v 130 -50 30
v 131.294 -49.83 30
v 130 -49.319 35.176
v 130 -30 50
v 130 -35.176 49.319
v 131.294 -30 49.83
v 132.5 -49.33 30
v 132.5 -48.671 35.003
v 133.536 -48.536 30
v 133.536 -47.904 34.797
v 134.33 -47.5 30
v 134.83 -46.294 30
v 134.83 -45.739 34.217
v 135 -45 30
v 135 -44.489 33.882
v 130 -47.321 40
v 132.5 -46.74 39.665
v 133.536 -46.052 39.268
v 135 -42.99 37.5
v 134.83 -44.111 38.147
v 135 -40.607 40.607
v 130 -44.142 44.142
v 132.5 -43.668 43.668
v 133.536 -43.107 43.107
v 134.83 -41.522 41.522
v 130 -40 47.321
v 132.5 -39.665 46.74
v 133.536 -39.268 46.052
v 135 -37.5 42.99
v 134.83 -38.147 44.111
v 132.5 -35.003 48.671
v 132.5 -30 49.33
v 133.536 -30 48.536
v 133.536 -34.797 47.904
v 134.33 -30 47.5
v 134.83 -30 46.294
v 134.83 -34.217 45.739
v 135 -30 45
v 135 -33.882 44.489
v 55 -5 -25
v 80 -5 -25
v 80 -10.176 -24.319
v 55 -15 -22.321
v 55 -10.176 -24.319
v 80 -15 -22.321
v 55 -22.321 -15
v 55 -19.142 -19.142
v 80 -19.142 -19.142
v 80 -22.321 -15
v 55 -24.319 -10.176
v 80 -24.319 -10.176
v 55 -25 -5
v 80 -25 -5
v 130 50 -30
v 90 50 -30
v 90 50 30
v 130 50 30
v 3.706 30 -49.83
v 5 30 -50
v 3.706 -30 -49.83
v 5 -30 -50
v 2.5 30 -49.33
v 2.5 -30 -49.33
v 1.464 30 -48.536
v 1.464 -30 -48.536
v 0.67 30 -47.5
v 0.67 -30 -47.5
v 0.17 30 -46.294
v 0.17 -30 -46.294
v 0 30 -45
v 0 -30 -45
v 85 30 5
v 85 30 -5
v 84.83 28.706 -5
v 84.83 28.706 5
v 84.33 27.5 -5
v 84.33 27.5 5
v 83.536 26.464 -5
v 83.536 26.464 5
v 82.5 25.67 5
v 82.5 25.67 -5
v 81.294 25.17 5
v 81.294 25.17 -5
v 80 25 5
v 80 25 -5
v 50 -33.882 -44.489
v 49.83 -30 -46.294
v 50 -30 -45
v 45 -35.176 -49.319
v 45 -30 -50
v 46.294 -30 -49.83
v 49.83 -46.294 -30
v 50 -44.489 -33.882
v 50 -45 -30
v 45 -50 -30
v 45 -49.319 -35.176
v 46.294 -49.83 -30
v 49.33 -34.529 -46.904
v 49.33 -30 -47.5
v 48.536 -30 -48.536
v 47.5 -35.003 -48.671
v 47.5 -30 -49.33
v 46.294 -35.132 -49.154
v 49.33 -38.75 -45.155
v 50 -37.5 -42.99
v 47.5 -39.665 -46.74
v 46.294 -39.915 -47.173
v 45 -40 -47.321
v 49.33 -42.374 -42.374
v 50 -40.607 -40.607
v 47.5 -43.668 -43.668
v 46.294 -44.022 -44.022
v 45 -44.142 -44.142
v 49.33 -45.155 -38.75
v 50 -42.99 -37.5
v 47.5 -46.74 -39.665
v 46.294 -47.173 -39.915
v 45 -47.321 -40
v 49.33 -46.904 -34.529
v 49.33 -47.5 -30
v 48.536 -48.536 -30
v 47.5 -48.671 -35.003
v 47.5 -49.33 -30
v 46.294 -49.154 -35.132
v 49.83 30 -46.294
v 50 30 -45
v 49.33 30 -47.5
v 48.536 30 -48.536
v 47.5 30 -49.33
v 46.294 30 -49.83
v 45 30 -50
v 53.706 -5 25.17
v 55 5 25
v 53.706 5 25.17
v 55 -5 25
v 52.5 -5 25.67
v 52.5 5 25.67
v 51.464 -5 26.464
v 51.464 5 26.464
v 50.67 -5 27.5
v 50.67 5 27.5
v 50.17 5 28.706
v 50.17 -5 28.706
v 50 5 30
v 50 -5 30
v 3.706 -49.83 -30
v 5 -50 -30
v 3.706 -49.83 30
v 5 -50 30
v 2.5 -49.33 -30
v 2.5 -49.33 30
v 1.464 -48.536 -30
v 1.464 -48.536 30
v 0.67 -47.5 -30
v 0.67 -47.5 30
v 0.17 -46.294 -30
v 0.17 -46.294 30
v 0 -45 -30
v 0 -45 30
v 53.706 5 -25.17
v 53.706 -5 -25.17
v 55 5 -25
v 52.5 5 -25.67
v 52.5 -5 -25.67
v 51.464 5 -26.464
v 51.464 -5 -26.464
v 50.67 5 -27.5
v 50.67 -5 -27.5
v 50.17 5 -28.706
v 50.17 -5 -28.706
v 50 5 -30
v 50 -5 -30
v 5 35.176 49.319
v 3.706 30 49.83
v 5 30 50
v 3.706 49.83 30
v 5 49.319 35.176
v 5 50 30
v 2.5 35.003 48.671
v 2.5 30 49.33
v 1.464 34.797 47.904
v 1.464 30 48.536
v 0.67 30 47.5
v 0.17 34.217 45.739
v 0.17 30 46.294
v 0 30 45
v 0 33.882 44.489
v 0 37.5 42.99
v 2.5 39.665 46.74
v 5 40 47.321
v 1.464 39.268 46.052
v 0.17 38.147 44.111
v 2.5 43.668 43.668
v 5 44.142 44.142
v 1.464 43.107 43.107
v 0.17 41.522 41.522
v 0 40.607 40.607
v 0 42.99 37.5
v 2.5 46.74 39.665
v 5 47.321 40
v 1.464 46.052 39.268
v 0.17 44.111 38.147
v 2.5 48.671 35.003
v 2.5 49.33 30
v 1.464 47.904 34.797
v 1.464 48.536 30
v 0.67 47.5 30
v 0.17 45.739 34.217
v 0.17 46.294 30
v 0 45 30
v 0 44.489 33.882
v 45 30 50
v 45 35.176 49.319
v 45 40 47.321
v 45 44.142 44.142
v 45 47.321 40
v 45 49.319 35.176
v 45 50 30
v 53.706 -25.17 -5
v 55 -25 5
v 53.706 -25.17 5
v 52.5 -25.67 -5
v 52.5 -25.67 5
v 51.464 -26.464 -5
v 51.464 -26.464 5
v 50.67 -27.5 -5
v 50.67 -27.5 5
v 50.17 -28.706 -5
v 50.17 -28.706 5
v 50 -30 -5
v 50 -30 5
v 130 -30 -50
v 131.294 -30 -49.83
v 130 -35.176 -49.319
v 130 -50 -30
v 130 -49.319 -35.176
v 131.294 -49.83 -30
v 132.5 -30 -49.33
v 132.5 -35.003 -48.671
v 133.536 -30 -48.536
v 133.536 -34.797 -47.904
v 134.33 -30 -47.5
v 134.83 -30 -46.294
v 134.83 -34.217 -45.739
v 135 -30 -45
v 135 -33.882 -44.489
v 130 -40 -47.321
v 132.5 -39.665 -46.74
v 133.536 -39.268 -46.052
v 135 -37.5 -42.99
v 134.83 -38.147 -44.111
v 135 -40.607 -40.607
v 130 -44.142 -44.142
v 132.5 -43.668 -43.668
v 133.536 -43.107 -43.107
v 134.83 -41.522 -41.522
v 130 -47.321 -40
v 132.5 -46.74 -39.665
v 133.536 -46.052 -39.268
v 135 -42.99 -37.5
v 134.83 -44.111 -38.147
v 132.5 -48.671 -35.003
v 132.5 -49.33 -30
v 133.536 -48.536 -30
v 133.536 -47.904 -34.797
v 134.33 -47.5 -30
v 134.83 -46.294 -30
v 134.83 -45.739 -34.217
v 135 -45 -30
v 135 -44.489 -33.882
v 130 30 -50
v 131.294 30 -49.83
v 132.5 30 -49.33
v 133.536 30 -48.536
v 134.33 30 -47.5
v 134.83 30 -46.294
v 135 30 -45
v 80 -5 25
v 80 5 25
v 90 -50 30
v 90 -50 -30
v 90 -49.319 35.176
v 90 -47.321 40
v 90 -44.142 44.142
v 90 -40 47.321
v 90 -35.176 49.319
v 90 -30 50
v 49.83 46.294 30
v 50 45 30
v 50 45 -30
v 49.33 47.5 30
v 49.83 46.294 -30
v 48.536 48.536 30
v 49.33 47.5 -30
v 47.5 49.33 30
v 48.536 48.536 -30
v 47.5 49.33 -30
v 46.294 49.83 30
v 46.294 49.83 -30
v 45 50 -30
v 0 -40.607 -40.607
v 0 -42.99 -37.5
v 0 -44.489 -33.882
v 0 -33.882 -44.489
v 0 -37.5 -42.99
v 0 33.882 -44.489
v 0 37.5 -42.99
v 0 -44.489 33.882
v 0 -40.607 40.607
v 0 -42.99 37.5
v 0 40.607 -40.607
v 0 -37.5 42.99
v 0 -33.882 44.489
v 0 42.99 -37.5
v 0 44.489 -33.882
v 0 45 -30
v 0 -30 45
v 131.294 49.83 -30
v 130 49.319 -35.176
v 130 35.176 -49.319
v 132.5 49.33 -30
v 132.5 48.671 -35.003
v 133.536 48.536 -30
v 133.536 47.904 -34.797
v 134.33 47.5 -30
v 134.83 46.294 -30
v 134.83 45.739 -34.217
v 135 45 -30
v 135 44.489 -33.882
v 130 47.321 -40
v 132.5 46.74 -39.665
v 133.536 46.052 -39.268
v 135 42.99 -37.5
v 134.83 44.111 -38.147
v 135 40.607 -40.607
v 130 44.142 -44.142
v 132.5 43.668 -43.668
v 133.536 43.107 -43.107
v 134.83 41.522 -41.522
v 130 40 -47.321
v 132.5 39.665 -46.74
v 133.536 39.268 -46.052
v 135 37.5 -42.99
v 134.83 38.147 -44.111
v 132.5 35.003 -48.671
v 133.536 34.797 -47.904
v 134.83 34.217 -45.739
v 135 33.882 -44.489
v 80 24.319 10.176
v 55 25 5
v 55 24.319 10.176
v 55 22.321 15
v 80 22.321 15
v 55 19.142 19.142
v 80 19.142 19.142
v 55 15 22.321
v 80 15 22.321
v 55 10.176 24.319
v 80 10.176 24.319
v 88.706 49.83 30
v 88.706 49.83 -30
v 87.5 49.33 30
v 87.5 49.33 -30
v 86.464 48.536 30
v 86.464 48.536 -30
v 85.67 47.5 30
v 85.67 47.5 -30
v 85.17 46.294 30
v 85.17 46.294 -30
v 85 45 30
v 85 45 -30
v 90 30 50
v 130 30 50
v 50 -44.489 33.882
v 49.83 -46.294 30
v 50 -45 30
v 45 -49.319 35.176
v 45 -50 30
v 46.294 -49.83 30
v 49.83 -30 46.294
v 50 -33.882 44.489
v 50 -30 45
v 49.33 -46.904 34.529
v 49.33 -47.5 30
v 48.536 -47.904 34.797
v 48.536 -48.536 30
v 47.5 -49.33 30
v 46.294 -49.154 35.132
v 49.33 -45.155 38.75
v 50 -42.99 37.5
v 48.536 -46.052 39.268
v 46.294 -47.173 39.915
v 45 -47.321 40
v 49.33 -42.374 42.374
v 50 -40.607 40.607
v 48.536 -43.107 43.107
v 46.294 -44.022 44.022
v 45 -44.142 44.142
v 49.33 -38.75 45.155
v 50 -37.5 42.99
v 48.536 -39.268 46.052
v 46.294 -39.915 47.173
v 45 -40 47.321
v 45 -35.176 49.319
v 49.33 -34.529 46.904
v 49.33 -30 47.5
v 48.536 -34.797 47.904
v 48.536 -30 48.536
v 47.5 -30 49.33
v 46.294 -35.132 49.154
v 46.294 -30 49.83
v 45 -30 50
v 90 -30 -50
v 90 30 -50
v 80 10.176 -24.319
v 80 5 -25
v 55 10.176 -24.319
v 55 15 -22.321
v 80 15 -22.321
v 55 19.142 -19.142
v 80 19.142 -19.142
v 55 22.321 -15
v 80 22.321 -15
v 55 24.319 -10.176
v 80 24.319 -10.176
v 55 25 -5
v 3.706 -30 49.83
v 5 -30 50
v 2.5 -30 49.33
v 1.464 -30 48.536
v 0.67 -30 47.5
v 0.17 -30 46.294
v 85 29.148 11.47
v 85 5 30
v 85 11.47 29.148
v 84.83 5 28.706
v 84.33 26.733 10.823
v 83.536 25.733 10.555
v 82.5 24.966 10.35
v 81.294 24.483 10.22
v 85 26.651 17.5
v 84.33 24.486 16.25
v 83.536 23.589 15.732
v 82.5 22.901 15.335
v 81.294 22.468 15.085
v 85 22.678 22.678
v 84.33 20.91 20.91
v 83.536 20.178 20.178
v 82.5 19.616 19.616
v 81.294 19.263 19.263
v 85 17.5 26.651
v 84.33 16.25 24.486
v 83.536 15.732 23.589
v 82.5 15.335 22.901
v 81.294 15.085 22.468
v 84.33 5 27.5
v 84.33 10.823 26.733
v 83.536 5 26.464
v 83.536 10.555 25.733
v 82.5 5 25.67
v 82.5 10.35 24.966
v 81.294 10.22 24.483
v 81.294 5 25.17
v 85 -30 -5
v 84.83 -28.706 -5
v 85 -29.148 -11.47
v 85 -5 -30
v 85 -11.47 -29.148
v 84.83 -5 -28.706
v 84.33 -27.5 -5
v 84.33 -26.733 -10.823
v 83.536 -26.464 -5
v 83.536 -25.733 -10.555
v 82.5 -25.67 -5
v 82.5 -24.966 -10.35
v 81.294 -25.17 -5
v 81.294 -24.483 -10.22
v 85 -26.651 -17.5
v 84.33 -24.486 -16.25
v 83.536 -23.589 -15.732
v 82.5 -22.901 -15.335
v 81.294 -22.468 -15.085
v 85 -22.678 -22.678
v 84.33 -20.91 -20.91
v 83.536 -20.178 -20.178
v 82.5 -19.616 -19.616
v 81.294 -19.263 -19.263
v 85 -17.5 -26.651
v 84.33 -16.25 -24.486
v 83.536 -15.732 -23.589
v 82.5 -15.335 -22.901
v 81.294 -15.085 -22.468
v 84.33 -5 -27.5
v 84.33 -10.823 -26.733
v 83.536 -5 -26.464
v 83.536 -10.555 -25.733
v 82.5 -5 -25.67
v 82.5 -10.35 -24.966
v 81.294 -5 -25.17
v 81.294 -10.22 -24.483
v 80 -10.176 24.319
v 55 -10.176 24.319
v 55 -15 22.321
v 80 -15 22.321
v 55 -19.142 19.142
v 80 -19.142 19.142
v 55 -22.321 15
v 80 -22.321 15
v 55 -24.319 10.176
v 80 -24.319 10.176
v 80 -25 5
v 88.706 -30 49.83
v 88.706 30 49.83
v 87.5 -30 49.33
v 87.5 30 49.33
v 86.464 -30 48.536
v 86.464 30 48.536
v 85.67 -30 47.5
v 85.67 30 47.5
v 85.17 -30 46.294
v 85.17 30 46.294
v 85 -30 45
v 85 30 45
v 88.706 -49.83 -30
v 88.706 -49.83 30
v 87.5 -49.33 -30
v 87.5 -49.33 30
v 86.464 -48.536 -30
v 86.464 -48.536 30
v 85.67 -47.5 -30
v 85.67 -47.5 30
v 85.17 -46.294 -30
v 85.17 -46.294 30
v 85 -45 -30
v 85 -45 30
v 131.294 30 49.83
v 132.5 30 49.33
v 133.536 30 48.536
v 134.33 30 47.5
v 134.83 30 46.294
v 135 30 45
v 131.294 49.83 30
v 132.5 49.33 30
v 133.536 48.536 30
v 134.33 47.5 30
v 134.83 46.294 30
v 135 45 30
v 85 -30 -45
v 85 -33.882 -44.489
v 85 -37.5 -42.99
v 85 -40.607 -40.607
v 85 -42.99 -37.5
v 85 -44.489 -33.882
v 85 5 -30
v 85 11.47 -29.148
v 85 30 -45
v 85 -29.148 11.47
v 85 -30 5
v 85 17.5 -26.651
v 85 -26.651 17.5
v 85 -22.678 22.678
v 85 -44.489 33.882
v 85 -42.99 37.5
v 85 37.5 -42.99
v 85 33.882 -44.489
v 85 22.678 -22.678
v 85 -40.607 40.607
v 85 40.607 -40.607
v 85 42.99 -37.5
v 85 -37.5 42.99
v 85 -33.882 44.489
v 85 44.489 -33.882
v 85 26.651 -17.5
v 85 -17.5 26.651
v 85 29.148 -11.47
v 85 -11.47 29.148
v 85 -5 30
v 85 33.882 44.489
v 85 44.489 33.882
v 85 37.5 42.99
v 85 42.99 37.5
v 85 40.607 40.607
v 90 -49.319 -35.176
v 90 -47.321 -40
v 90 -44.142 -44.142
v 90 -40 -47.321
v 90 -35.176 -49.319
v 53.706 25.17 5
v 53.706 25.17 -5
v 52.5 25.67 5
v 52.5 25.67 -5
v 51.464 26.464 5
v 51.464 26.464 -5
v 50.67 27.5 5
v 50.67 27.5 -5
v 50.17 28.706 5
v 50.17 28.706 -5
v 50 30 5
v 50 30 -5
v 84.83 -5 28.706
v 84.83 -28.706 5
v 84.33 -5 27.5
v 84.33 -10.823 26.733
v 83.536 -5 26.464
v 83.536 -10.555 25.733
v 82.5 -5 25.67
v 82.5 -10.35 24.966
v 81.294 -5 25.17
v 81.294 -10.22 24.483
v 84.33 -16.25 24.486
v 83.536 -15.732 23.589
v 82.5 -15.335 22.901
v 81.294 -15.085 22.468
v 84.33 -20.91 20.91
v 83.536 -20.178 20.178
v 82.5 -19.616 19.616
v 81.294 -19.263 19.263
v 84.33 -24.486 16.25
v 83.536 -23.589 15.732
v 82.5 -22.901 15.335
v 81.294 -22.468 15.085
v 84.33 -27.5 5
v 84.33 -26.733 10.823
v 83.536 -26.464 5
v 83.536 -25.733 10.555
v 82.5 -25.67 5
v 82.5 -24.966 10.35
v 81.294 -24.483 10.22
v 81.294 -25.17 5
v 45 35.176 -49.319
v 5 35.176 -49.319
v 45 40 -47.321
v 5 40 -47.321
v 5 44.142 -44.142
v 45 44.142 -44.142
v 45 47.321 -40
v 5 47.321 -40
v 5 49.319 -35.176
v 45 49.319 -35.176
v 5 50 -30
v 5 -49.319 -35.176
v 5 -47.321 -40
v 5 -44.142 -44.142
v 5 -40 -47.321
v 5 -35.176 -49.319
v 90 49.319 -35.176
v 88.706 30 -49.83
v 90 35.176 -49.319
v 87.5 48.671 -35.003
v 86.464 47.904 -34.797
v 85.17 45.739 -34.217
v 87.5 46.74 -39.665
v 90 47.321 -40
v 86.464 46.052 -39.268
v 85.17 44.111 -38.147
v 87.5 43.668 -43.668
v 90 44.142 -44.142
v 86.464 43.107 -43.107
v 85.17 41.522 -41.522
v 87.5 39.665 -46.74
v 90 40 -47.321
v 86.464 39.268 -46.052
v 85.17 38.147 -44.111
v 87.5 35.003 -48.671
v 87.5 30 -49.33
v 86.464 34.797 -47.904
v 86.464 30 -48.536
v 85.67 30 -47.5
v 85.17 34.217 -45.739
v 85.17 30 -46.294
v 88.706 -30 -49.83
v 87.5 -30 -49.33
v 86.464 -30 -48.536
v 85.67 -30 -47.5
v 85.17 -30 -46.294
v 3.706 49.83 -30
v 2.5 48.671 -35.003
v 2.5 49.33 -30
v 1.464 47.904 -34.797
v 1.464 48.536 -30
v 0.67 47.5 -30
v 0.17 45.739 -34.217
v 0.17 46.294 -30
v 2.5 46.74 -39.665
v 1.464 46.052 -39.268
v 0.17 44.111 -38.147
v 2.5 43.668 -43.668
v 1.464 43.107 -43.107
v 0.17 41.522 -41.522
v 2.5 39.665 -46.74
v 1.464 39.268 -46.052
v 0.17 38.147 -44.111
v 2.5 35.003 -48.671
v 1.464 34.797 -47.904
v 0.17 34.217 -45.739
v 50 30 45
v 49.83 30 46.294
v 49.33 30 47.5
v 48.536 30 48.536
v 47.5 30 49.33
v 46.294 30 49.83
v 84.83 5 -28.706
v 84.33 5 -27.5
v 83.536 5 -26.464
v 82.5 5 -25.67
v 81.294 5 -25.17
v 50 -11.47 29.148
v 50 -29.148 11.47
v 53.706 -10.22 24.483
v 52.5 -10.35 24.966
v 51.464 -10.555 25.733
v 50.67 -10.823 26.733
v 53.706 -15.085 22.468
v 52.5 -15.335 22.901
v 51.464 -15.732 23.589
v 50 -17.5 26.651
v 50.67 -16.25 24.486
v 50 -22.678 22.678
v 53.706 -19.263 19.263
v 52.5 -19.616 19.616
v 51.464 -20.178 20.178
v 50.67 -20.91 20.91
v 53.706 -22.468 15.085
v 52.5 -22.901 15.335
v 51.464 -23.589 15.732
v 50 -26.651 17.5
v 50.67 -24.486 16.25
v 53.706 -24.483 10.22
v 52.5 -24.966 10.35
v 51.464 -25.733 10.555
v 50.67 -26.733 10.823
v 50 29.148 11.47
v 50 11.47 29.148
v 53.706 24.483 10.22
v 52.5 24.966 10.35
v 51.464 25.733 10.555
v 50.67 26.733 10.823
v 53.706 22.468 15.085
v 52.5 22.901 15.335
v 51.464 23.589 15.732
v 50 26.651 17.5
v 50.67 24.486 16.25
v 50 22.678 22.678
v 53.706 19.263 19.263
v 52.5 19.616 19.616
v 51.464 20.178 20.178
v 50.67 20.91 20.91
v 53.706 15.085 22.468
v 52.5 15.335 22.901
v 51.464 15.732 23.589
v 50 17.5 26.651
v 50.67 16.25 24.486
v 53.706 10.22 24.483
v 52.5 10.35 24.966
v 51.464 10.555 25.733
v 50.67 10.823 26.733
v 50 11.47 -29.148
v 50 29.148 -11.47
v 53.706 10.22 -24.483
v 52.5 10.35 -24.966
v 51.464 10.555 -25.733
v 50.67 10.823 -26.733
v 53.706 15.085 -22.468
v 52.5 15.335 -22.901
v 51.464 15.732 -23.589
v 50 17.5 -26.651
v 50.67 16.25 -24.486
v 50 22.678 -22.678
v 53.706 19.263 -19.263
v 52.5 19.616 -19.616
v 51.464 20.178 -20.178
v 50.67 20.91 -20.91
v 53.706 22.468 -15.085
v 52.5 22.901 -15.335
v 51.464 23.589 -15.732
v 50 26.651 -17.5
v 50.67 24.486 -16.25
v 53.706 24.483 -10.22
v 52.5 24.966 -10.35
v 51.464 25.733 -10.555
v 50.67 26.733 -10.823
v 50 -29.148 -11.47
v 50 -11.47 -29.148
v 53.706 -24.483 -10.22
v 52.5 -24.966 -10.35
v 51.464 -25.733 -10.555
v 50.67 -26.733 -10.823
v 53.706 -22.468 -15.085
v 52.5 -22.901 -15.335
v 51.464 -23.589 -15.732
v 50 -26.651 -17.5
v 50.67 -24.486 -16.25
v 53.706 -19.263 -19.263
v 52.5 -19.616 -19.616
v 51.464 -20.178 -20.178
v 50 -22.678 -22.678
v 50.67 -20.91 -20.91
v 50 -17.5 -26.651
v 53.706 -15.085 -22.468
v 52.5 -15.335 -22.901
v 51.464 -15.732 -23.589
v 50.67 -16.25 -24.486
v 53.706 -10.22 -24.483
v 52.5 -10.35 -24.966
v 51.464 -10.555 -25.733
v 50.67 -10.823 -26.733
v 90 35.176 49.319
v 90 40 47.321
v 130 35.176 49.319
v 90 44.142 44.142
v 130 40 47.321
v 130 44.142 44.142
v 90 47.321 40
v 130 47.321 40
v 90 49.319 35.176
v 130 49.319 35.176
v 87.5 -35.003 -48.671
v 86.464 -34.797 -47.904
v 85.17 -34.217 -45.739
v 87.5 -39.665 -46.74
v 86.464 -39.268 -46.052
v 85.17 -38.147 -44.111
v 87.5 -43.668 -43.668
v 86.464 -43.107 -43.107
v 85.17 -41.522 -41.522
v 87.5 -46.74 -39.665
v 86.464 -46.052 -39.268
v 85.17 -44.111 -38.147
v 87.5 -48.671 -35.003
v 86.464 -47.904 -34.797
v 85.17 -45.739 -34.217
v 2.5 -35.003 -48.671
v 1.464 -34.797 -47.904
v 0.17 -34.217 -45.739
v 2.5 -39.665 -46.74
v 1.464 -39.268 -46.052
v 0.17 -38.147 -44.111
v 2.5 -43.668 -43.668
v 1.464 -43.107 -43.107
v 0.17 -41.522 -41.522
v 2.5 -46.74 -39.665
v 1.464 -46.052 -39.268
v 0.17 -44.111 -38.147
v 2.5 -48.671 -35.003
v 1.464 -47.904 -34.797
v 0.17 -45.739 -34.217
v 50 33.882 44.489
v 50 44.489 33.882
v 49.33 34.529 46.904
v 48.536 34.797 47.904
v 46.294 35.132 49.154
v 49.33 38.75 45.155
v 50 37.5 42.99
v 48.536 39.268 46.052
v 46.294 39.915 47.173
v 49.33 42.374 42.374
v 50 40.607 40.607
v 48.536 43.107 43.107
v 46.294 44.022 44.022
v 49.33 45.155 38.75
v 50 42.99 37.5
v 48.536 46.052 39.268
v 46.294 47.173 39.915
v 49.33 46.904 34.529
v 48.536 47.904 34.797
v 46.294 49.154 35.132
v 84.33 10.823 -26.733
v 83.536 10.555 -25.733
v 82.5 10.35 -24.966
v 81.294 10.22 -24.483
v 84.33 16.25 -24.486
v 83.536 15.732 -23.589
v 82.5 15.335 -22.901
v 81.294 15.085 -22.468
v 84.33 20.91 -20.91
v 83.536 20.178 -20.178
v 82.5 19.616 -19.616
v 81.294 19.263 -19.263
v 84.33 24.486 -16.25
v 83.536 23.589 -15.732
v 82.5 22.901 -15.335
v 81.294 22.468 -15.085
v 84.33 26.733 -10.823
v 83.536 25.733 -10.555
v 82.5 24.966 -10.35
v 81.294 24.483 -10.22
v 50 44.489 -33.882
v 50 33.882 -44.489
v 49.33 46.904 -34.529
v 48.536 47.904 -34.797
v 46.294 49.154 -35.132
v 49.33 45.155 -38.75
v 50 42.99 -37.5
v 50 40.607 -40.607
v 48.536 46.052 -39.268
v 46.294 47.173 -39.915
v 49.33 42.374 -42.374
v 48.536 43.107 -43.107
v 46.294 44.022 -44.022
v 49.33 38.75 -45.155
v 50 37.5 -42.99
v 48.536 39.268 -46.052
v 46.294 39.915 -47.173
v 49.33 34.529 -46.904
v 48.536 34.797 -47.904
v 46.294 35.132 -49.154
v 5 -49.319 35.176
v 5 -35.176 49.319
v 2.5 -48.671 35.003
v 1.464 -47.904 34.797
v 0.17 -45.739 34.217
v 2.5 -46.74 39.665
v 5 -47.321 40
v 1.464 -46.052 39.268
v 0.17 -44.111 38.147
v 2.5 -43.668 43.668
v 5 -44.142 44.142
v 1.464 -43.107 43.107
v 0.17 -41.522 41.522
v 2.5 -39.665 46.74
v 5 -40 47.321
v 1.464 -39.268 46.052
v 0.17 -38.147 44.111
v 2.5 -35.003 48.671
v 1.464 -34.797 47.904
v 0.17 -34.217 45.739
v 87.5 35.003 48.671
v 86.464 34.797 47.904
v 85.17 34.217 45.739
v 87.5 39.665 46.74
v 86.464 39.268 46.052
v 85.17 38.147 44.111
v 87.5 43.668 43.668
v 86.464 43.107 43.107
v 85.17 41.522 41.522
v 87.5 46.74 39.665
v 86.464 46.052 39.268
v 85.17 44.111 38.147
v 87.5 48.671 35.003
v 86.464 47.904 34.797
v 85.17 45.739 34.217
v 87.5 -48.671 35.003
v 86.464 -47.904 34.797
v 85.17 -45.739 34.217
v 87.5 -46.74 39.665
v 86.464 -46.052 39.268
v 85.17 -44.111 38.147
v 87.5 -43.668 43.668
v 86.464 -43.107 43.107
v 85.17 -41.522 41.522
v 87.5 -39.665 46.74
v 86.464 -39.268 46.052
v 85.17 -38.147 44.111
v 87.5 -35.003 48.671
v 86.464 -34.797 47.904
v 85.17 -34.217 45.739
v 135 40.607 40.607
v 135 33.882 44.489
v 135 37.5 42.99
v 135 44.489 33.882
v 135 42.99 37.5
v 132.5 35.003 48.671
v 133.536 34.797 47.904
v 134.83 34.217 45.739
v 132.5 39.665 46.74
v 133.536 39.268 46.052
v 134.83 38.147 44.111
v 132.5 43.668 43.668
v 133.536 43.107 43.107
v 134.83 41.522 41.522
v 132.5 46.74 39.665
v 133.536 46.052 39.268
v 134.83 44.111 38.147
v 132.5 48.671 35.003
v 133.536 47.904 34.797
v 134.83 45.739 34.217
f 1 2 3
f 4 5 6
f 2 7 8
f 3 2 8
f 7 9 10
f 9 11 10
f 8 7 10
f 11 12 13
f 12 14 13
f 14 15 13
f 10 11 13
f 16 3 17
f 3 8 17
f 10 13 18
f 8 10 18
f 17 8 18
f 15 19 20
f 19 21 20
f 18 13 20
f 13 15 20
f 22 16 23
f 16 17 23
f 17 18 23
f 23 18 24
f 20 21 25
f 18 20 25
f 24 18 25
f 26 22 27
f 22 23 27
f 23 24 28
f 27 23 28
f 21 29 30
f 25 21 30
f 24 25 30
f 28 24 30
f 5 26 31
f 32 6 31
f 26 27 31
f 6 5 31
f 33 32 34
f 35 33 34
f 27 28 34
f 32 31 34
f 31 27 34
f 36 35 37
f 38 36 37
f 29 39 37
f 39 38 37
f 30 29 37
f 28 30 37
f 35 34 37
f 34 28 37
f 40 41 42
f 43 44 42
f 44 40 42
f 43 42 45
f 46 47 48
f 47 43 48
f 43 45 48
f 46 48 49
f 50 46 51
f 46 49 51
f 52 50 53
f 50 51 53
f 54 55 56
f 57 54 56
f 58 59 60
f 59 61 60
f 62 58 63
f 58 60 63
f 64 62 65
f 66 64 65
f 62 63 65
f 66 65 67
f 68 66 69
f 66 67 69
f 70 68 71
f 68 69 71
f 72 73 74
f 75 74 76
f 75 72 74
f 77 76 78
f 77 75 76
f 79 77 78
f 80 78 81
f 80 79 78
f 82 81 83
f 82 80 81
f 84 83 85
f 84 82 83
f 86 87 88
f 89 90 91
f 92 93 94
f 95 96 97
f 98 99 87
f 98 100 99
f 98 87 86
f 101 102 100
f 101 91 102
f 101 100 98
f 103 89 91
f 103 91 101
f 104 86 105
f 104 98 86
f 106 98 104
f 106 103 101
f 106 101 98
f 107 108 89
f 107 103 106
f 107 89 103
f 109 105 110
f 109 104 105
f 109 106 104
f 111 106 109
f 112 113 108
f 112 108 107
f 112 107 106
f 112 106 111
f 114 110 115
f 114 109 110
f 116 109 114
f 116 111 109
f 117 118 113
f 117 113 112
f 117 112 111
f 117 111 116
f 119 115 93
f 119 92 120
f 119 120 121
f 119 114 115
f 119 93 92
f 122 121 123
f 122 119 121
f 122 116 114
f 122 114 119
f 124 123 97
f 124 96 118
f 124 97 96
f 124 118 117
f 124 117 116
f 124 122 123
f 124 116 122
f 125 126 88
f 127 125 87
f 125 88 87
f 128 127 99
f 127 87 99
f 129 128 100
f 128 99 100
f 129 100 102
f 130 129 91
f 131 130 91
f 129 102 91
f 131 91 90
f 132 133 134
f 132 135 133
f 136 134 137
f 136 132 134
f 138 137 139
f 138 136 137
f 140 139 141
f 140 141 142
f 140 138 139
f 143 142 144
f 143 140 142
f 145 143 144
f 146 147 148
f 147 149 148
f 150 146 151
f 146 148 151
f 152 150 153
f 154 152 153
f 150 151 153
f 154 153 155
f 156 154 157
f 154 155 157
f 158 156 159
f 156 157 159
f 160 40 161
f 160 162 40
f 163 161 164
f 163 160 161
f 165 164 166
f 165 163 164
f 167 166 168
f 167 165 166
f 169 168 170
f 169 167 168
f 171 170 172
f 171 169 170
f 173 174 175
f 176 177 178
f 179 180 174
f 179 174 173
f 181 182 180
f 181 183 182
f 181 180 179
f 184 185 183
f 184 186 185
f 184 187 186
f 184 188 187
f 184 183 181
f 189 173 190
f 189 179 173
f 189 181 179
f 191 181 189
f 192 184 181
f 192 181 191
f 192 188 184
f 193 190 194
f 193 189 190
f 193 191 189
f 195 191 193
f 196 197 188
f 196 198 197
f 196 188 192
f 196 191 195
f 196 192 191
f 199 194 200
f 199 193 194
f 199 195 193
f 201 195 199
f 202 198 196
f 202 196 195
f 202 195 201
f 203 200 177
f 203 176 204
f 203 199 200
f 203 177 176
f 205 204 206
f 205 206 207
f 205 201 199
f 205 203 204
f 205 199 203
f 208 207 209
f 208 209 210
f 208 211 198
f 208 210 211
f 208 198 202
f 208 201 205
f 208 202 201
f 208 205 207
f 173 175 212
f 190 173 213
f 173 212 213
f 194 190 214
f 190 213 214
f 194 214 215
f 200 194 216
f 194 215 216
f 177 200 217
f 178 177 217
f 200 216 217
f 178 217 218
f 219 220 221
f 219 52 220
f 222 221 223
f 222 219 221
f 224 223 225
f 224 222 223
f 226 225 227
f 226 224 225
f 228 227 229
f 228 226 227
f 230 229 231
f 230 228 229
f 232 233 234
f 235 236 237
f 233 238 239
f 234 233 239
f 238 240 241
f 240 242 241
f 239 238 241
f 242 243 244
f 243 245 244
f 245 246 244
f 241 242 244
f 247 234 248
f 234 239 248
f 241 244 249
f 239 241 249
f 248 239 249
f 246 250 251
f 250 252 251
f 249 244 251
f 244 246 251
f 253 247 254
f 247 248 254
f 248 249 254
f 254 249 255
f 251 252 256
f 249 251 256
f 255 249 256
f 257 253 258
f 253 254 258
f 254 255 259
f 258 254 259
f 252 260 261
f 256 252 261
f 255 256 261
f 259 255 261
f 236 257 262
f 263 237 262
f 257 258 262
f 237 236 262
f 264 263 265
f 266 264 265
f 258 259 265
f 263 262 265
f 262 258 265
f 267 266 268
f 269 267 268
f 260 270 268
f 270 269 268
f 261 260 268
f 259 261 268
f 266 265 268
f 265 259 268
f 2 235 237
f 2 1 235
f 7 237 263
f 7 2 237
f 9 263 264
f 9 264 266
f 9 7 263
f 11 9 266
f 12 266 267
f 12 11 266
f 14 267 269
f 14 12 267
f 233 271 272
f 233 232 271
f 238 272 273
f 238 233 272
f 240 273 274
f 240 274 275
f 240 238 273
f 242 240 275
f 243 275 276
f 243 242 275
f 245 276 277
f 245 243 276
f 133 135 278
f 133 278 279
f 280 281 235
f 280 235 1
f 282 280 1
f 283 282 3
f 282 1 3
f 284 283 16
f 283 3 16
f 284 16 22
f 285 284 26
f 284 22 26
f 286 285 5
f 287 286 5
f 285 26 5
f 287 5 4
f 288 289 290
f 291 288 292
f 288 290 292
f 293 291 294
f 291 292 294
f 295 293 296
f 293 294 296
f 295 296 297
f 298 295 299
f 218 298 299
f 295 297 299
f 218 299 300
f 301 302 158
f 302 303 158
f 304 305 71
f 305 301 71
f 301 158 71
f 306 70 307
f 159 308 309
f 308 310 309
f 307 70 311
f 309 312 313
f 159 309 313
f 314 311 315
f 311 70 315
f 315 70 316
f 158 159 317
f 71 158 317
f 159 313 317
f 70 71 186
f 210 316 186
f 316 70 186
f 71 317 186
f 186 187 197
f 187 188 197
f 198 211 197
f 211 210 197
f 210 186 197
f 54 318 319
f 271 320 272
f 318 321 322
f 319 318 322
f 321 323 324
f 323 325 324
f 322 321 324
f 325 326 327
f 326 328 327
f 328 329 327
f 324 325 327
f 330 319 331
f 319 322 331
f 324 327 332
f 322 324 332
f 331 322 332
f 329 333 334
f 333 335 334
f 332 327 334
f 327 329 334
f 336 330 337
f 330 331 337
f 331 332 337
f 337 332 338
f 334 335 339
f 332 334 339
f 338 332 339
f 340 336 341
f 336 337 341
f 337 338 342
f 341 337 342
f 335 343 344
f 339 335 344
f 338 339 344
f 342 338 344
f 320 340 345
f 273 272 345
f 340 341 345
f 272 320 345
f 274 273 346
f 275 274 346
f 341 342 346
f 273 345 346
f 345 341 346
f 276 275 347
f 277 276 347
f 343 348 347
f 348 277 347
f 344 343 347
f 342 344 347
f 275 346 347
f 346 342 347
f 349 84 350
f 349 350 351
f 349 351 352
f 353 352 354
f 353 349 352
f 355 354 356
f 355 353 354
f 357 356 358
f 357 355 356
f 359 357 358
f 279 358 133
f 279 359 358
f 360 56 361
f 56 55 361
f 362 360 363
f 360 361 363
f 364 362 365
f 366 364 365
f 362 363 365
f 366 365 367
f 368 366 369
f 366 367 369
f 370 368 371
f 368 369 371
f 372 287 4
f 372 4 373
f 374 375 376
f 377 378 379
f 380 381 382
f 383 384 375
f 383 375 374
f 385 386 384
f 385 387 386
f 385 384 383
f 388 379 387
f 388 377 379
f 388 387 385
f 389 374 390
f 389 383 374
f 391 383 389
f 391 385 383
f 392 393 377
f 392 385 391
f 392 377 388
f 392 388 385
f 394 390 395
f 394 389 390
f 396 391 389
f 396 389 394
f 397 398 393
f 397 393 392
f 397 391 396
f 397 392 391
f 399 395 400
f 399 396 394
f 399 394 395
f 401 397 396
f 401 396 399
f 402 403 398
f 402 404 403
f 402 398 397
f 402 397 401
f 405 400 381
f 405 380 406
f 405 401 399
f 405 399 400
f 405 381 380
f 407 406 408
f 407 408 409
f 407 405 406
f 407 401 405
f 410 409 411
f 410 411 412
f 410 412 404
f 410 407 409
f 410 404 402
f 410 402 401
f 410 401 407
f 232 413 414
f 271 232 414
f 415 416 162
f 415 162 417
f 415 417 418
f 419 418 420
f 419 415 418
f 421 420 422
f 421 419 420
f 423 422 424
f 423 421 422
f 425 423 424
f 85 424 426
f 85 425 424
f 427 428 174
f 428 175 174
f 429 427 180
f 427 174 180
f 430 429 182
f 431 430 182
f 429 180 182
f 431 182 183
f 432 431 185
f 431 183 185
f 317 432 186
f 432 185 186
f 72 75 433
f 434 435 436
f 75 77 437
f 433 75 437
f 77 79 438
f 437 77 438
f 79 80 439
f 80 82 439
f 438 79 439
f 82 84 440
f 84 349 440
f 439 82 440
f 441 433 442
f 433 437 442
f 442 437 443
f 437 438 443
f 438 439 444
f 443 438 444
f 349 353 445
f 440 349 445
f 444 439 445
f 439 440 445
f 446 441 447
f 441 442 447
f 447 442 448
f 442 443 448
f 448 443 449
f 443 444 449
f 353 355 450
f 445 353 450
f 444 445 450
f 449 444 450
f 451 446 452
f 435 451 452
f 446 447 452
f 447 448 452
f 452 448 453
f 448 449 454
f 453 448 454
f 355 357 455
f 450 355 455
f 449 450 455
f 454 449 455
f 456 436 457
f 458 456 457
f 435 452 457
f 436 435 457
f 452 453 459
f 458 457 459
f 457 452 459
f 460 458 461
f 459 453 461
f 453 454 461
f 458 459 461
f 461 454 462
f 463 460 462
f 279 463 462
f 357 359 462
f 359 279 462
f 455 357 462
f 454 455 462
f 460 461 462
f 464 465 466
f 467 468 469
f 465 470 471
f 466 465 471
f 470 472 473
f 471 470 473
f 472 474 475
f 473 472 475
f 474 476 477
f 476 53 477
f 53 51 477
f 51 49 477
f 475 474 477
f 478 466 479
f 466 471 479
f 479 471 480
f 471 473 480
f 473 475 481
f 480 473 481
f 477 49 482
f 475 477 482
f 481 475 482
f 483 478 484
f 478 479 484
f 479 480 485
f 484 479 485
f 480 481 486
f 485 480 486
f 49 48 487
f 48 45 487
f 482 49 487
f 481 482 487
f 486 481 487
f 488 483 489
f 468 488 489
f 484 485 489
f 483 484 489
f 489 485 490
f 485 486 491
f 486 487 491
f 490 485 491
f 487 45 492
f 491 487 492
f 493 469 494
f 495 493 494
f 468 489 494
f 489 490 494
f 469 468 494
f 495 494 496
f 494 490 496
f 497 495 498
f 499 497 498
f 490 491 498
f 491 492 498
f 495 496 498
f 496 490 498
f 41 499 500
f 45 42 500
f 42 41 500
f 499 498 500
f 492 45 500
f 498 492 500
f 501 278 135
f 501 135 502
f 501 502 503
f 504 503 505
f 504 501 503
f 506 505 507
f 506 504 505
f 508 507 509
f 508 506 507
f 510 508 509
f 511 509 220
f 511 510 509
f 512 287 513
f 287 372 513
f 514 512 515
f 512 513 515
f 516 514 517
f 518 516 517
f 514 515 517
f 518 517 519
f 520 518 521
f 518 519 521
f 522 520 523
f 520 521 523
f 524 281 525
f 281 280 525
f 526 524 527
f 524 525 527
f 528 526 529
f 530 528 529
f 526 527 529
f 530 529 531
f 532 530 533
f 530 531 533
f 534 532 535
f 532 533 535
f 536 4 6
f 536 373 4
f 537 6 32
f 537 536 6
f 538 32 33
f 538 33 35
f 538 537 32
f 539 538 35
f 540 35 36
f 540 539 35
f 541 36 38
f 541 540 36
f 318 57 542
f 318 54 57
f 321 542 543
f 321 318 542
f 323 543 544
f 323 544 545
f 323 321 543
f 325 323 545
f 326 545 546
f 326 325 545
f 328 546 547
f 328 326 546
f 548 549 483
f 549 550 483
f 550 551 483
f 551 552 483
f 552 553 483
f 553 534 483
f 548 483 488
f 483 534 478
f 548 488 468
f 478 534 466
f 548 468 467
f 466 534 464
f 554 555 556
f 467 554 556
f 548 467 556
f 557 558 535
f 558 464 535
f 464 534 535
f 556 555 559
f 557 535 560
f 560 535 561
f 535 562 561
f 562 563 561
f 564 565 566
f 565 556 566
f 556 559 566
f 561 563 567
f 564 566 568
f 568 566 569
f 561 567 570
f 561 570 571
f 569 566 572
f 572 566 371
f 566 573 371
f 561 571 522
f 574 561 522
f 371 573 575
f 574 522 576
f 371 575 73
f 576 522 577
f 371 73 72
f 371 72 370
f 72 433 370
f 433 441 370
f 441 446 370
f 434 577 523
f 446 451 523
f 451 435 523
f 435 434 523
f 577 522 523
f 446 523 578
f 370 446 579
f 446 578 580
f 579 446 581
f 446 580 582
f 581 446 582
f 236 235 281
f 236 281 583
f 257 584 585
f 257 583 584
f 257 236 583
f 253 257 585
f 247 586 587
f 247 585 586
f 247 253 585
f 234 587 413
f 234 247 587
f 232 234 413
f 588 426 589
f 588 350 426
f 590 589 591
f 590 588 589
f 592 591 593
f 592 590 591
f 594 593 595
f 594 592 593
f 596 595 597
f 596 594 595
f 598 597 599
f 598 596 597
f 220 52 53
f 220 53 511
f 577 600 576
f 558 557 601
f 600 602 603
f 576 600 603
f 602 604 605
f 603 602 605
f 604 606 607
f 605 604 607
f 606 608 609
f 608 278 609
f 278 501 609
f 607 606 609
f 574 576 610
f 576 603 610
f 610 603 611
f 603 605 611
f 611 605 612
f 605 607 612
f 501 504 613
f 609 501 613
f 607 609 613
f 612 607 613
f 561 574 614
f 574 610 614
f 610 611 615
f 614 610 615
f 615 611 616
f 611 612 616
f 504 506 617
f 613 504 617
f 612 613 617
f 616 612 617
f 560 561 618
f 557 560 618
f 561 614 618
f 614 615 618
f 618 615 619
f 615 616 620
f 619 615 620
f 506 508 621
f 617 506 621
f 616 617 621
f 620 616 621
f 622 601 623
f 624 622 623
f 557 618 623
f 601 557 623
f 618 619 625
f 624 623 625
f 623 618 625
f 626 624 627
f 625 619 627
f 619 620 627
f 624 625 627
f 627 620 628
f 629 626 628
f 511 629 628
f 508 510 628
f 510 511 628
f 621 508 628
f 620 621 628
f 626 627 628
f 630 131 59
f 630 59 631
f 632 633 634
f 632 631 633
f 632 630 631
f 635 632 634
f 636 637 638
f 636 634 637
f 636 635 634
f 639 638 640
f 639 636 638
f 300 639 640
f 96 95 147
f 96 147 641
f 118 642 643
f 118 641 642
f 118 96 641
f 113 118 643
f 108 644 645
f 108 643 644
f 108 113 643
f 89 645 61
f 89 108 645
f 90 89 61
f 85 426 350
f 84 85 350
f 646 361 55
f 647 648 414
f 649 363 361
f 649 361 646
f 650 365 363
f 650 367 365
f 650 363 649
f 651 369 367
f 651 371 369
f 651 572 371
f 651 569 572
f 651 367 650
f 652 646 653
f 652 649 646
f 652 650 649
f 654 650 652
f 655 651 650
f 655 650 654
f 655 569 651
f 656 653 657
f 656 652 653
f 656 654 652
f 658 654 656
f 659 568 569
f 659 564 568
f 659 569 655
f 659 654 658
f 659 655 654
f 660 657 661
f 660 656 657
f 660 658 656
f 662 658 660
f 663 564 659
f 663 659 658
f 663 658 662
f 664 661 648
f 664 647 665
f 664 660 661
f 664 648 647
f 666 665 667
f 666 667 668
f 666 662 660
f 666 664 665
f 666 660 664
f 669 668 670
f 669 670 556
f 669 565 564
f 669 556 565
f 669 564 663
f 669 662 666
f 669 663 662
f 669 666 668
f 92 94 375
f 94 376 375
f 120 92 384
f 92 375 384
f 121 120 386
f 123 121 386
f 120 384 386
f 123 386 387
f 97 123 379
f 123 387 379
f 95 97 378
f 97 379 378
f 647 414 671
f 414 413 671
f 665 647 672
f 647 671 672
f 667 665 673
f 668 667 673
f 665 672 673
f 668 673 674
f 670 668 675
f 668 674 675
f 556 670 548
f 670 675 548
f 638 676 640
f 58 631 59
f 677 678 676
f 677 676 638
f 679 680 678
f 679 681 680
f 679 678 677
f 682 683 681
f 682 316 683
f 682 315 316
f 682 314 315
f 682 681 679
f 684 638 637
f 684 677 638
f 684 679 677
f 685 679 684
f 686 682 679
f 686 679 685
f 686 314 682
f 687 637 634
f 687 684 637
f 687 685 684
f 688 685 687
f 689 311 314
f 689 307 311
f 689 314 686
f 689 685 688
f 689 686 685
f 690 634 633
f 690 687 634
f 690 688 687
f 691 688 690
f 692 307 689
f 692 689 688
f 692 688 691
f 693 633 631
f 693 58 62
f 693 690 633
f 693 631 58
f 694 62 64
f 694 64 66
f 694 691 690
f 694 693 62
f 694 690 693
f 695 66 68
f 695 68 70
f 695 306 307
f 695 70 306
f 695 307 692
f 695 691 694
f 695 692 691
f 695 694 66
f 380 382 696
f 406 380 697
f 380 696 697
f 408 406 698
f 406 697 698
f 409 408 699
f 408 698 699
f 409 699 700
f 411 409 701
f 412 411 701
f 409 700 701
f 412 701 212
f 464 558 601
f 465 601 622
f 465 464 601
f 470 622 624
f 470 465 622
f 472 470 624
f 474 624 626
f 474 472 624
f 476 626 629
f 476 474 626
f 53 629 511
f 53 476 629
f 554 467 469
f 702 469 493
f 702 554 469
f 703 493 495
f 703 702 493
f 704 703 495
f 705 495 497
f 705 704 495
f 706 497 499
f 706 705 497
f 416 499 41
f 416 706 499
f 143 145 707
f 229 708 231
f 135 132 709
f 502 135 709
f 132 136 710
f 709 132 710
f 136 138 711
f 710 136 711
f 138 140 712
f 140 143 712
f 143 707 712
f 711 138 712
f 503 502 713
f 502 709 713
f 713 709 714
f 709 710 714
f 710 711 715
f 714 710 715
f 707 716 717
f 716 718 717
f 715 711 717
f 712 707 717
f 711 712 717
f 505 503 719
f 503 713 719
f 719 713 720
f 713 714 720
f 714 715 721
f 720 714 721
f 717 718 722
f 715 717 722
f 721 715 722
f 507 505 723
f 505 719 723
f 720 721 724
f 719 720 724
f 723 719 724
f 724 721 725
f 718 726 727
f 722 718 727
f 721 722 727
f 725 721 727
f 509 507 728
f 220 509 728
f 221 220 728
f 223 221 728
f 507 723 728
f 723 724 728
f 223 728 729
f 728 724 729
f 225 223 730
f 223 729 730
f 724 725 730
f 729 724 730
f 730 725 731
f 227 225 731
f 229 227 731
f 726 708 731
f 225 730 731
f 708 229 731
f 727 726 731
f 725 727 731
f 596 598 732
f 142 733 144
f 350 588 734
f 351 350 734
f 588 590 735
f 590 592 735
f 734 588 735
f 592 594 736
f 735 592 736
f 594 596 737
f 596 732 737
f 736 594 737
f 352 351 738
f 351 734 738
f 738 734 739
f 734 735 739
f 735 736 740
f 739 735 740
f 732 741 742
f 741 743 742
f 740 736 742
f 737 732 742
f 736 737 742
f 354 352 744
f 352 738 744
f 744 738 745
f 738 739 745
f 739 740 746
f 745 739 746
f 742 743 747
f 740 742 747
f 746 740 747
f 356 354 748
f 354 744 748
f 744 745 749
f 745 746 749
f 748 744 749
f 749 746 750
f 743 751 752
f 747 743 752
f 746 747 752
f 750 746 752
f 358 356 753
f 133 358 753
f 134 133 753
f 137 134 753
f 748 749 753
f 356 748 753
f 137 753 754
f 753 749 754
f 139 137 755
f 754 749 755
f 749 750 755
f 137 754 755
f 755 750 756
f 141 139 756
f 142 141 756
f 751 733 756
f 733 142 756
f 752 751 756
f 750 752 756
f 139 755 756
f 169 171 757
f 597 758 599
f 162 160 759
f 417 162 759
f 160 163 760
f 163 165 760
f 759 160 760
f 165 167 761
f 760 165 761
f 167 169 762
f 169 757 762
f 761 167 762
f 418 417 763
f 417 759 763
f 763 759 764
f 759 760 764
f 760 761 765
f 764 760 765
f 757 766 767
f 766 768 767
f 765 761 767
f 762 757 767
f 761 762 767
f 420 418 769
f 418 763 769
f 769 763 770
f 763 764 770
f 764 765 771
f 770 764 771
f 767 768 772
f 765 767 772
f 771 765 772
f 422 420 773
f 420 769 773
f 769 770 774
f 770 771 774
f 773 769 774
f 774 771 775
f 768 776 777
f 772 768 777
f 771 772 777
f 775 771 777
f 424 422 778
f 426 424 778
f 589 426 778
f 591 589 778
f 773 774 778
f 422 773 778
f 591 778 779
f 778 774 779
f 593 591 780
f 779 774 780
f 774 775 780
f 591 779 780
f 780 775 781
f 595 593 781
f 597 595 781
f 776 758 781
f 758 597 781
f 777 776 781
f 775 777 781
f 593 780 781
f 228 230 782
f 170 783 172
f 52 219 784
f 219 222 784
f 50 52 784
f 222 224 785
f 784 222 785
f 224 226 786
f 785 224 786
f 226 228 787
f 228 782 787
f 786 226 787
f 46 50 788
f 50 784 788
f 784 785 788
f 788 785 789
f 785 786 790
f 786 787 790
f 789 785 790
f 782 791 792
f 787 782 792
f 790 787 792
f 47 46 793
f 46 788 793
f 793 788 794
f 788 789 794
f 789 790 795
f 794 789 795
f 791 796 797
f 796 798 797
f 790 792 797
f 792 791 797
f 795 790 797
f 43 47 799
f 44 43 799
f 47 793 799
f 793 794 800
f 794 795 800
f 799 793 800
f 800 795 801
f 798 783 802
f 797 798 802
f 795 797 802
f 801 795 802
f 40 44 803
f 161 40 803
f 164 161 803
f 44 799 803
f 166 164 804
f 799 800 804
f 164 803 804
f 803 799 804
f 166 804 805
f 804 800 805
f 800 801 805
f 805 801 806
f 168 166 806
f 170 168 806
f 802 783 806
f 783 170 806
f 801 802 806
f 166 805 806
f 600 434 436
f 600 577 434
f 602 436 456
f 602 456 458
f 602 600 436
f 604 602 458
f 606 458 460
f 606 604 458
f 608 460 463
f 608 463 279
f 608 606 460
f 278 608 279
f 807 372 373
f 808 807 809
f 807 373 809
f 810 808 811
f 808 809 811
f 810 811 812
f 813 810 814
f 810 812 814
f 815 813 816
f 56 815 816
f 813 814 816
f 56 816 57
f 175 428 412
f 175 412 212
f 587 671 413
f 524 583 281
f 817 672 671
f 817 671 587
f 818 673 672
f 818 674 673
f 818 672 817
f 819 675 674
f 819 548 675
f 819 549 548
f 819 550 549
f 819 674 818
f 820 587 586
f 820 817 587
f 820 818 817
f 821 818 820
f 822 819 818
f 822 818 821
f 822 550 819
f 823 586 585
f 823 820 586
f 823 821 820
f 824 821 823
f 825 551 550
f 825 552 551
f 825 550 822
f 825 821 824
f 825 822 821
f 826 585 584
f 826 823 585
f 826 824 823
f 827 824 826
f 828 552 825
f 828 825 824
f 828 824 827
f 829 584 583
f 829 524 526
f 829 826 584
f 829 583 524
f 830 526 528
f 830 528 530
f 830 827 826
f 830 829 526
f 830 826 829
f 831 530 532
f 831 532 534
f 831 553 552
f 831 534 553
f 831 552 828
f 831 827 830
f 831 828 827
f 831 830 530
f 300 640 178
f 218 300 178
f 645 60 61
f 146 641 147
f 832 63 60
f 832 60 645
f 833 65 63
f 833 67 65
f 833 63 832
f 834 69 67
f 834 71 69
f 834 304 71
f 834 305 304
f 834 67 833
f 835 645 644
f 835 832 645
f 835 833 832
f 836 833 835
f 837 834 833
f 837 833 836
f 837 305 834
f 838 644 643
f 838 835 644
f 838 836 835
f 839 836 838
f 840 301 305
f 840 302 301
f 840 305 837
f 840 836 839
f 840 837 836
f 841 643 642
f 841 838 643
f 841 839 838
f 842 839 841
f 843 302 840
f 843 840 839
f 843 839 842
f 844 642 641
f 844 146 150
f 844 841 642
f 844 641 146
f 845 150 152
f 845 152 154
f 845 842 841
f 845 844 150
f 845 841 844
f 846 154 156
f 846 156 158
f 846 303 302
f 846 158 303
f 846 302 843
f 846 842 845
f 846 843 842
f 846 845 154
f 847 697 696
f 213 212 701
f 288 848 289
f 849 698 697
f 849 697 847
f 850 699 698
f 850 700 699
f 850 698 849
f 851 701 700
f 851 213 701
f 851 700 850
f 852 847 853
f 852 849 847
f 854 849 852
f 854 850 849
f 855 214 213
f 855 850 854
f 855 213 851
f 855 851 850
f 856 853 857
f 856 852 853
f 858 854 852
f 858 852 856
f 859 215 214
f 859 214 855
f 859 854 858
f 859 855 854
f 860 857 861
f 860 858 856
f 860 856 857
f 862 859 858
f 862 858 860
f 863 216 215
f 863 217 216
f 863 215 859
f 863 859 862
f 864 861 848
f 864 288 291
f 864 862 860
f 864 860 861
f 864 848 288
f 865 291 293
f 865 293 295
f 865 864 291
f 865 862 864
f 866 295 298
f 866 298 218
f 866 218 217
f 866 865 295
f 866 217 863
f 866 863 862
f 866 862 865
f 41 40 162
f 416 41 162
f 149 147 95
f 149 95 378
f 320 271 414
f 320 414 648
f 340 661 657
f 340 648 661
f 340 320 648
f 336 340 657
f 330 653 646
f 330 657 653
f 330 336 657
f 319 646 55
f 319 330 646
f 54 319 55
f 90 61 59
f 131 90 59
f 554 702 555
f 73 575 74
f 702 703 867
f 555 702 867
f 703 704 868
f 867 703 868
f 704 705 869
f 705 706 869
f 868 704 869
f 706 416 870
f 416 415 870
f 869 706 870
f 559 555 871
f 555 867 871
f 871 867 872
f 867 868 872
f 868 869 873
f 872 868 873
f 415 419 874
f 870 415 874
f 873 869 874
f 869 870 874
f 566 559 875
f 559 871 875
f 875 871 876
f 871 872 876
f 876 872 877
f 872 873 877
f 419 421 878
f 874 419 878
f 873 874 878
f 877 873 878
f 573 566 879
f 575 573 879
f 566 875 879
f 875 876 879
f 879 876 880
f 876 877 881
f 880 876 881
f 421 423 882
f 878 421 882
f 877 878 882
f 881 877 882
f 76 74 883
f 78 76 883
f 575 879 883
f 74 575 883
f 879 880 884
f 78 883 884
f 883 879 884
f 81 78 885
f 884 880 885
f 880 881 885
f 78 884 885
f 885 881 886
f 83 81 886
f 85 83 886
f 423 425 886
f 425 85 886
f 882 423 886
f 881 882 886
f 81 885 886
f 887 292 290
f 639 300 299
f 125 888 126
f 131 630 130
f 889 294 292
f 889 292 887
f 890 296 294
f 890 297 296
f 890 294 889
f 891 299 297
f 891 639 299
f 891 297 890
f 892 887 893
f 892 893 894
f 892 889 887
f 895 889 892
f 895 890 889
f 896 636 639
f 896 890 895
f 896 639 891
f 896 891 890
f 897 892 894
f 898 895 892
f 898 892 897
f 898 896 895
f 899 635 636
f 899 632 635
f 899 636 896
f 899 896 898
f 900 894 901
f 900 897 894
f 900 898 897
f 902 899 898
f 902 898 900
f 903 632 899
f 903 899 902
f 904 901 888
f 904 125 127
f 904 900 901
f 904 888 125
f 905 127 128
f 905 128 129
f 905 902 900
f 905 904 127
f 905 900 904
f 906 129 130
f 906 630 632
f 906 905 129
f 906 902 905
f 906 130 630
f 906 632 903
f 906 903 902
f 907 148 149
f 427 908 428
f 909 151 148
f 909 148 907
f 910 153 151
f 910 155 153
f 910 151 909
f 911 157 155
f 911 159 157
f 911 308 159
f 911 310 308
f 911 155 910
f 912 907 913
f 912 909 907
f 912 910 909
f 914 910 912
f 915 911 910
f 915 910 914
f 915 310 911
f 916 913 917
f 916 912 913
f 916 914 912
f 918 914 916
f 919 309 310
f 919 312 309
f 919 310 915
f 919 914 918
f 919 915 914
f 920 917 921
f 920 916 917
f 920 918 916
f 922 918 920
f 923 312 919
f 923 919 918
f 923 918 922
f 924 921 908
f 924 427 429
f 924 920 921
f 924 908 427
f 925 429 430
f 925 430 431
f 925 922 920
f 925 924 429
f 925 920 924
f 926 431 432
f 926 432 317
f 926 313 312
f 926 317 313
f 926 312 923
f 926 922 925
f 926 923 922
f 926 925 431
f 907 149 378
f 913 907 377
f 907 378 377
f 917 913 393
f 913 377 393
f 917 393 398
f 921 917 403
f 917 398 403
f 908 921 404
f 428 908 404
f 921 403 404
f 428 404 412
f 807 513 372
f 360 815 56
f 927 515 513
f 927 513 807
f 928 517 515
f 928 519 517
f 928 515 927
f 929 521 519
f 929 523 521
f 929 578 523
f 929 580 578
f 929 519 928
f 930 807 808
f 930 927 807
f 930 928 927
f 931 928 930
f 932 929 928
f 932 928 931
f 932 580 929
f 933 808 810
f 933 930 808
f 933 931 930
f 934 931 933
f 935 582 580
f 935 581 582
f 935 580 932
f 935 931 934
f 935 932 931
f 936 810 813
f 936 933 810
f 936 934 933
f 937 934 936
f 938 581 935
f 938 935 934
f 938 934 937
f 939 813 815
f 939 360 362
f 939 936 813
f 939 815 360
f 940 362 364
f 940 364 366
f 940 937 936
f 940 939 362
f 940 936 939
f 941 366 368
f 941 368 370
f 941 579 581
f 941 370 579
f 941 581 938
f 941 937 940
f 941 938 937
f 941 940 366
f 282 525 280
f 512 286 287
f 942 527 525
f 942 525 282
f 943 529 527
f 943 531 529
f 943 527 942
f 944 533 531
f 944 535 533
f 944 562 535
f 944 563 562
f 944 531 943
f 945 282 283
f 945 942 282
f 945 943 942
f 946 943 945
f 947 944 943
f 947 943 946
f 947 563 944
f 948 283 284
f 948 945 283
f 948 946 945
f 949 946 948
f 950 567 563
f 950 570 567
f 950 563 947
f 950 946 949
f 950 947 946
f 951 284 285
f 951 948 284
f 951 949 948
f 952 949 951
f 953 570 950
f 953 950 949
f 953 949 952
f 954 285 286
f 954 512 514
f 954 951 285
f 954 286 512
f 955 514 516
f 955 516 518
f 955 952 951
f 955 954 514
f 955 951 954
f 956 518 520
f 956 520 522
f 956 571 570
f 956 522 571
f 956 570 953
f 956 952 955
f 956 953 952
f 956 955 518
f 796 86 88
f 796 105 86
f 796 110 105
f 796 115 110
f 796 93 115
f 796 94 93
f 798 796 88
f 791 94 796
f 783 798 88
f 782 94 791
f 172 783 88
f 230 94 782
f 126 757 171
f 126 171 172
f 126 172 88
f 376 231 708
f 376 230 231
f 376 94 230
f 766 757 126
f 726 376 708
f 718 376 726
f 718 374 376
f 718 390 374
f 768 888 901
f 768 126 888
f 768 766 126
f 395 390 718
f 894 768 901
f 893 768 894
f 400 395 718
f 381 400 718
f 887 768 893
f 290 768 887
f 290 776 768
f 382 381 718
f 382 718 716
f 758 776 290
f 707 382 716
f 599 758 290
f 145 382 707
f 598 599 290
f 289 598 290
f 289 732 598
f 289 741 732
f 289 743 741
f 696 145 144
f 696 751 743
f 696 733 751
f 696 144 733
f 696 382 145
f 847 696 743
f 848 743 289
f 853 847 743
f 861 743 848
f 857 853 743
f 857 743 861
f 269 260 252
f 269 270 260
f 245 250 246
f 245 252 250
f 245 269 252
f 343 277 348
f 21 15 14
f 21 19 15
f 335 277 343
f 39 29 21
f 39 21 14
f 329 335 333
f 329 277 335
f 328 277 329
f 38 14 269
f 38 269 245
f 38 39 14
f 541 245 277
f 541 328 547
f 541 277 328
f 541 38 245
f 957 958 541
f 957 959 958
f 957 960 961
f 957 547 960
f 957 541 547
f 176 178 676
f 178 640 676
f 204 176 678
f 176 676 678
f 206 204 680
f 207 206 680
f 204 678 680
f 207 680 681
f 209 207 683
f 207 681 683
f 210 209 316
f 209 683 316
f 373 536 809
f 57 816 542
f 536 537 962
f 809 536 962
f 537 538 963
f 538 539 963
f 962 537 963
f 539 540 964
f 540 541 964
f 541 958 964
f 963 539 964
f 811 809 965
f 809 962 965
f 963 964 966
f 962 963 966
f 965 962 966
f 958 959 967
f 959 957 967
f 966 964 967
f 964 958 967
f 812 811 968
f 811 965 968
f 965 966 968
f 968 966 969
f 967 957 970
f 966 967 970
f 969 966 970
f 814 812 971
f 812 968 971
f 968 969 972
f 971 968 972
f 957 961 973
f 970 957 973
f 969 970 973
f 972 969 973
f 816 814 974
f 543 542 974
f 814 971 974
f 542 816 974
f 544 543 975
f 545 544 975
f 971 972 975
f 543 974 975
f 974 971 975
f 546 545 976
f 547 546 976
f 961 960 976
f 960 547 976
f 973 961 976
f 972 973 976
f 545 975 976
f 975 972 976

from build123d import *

# Parameters (mm, degrees)
F0_W     = 100
F0_H     = 100
F1_DEPTH = 50
F2_W     = 50
F2_H     = 50
F3_DEPTH = 35
F4_W     = 100
F4_H     = 100
F5_DEPTH = 50
F6_R     = 20
F7_R     = 5


with BuildPart() as f1:
    # F0 (on Right) → F1 (new body)
    with BuildSketch(Plane.YZ):
        Rectangle(F0_W, F0_H)
    extrude(amount=F1_DEPTH)

    # F2 (on face) → F3 (join)
    with BuildSketch(Plane.YZ.offset(50)):
        Rectangle(F2_W, F2_H)
    extrude(amount=F3_DEPTH)

    # F4 (on face) → F5 (join)
    with BuildSketch(Plane.YZ.offset(85)):
        Rectangle(F4_W, F4_H)
    extrude(amount=F5_DEPTH)

    # F6
    f6_edges = [f1.edges().sort_by_distance(p)[0] for p in [
        (110, 50, -50),
        (25, 50, -50),
        (25, 50, 50),
        (110, 50, 50),
        (25, -50, -50),
        (110, -50, -50),
        (25, -50, 50),
        (110, -50, 50),
        (67.5, 25, -25),
        (67.5, 25, 25),
        (67.5, -25, -25),
        (67.5, -25, 25),
    ]]
    fillet(f6_edges, radius=F6_R)

    # F7
    f7_edges = [f1.edges().sort_by_distance(p)[0] for p in [
        (50, -19.142136, 19.142136),
        (50, -50, 0),
        (85, -50, 0),
        (135, -50, 0),
        (0, -50, 0),
        (85, -19.142136, 19.142136),
    ]]
    fillet(f7_edges, radius=F7_R)


solid = f1.part
